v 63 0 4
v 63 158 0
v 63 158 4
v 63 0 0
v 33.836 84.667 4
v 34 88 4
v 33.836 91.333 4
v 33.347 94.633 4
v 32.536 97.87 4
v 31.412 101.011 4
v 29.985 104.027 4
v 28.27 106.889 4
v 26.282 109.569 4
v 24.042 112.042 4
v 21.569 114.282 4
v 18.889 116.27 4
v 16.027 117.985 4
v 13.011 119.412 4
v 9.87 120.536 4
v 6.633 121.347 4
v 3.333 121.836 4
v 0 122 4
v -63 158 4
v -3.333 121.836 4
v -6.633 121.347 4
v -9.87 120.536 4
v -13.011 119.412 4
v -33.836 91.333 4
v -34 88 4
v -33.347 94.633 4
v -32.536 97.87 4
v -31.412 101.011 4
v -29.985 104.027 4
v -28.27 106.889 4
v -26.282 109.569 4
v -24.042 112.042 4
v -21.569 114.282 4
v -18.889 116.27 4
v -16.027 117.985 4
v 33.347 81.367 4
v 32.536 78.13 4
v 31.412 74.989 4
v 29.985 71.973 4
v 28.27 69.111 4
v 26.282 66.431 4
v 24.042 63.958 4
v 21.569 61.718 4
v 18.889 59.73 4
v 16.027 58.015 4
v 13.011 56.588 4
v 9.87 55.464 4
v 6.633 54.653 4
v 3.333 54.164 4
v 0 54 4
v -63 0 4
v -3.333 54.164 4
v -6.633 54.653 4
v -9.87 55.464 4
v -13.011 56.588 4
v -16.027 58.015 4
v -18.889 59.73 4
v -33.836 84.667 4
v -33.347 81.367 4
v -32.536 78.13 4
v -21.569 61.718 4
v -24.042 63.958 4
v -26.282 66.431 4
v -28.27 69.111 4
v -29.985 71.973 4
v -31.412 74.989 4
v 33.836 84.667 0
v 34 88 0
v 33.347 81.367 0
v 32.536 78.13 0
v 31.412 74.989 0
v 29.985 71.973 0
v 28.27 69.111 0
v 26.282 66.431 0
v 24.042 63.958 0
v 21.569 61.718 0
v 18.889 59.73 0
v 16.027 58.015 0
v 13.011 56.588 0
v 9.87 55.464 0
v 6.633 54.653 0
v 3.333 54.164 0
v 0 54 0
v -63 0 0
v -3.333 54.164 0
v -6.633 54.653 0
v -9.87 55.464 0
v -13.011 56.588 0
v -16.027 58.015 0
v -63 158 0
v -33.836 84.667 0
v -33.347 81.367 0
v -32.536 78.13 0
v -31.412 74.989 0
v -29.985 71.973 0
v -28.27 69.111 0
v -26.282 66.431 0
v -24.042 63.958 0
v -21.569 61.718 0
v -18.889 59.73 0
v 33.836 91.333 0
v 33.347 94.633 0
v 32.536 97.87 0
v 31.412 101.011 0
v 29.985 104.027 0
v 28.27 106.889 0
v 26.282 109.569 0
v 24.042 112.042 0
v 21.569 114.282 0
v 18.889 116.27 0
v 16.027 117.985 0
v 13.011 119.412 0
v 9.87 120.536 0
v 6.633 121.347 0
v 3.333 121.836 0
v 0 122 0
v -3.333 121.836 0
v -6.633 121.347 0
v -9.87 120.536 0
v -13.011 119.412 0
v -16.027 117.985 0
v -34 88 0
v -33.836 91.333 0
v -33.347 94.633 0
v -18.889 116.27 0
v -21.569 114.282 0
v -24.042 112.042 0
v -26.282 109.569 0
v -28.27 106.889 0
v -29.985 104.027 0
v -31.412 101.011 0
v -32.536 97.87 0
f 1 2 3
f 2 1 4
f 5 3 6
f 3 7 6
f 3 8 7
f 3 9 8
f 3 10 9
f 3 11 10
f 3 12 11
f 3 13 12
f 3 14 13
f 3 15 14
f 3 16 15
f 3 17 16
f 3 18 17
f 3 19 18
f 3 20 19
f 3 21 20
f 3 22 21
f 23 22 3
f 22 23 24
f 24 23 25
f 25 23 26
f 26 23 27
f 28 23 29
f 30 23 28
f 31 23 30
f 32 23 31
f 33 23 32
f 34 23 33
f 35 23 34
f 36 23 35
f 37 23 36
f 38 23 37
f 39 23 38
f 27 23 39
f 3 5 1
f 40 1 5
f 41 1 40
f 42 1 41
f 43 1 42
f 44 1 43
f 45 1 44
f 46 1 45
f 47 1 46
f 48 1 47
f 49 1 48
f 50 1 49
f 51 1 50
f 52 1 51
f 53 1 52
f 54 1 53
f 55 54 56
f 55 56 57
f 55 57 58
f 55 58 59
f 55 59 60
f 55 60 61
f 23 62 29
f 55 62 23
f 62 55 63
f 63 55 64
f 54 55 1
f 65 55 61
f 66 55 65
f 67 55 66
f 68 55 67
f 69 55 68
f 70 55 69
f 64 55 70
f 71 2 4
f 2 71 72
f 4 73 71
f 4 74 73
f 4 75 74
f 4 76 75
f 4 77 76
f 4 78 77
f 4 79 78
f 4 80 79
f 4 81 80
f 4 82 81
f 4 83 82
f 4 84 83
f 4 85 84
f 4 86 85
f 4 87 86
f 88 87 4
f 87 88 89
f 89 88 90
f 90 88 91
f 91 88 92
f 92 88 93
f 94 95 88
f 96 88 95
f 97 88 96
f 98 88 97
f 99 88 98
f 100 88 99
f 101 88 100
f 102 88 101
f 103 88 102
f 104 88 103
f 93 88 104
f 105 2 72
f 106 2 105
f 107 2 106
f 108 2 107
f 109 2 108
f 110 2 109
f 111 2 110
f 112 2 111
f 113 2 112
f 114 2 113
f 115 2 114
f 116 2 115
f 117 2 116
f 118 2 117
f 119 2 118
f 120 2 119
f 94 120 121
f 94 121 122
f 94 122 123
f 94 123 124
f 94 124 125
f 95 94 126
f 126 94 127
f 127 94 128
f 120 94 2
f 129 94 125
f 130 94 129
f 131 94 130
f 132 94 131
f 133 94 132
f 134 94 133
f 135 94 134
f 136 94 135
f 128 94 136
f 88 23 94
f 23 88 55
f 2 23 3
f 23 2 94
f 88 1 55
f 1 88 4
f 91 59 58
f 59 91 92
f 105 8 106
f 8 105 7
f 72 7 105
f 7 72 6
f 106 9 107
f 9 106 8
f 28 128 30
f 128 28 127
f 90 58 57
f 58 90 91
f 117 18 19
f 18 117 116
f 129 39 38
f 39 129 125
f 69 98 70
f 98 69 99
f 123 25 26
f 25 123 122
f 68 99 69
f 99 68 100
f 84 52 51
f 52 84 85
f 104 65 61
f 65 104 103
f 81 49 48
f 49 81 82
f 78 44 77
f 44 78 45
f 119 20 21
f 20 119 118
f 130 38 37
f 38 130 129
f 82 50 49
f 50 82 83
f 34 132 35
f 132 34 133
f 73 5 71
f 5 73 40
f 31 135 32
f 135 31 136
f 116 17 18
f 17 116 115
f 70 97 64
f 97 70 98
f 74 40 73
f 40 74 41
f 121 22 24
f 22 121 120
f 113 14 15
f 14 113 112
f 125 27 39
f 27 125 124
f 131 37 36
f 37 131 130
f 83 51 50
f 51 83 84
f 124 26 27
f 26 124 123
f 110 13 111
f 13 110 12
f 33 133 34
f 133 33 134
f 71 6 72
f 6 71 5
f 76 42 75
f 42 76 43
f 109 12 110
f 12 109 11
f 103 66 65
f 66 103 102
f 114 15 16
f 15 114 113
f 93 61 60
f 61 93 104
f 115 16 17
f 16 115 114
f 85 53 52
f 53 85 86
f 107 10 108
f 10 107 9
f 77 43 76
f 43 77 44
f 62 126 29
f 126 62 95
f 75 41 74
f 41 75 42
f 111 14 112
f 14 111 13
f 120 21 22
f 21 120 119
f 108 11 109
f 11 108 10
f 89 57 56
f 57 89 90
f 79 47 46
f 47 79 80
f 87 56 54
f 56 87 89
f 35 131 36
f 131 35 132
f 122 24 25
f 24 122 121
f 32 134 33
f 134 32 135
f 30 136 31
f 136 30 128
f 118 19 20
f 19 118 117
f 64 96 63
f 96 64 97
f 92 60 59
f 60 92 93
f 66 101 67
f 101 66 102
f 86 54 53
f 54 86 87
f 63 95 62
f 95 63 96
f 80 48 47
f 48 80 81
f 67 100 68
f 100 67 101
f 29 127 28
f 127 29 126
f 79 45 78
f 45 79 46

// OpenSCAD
// file: ../dimensions.scad
// dimensions.scad — single source of truth for all tray geometry constants.
//
// All values in millimetres unless otherwise noted.
// Sources:
//   - CD/DVD drive envelope: SFF-8551 (5.25" half-height) and laptop slim ODD (9.5 mm)
//   - CD disc geometry: ECMA-130
//   - MiniDisc cartridge: Sony MiniDisc specification (MD)
//   - Issues weyucou/minidisc-tray#1 (3D modeling format research) and
//     weyucou/minidisc-tray#2 (CD/DVD tray dimensions)


// ---------------------------------------------------------------------------
// CD/DVD drive envelope (target form factor)
// ---------------------------------------------------------------------------

// Primary target: 5.25" half-height (SFF-8551) drive body.
DRIVE_BODY_W = 146.1;   // outer width
DRIVE_BODY_H = 41.3;    // outer height
DRIVE_BODY_D = 170;     // outer depth (typical; range 170–203)

// Slim laptop ODD (9.5 mm) — secondary parametric variant.
SLIM_BODY_W = 128;
SLIM_BODY_H = 9.5;
SLIM_BODY_D = 127;


// ---------------------------------------------------------------------------
// CD tray envelope (the cavity the printed tray must fit into)
// ---------------------------------------------------------------------------

// Inner tray usable width — the lateral envelope between the tray side walls.
// Derived in #2: ~63 mm from spindle centre to each side wall.
TRAY_INNER_W = 126;

// Spindle-centre-to-front-bezel distance.
// Range observed across donor drives: 80–95 mm.
// Default = mid-range; UPDATE after physical measurement of the actual donor drive.
SPINDLE_TO_BEZEL = 88;

// CD program area (informational — used to validate spindle clearance).
// ECMA-130: program area lies between r=25 and r=58 mm.
CD_DISC_DIA = 120;
CD_CENTER_HOLE = 15;
CD_CLAMP_R_MIN = 26;
CD_CLAMP_R_MAX = 33;

// Inner tray usable depth — derived from spindle-to-bezel + CD radius + rear margin.
// Matches typical 5.25" half-height CD tray depth. Refine when donor drive measured.
TRAY_INNER_D = SPINDLE_TO_BEZEL + CD_DISC_DIA / 2 + 10;

// Spindle clearance hole radius — clears the CD spindle hub / clamp area.
// Sized at CD_CLAMP_R_MAX + 1 mm safety; also clears the MD internal disc edge.
SPINDLE_CLEARANCE_R = CD_CLAMP_R_MAX + 1;


// ---------------------------------------------------------------------------
// MiniDisc cartridge (the part the tray must position and shutter-actuate)
// ---------------------------------------------------------------------------

// Cartridge outer dimensions — Sony MD spec.
MD_W = 72;   // width  (along shutter slide axis)
MD_D = 68;   // depth  (perpendicular to shutter slide)
MD_H = 5;    // thickness

// Internal disc — used for spindle-clearance hole sizing and centring checks.
MD_DISC_DIA = 64;
MD_CENTER_HOLE = 11;


// ---------------------------------------------------------------------------
// Print and fit tolerances
// ---------------------------------------------------------------------------

// Per-side print clearance applied to mating surfaces (tray-to-cavity, MD pocket).
// Tuned for AFINIA H400+ FDM with default Afinia Studio profile.
FIT_CLEARANCE = 0.4;

// OpenSCAD render facet count for circular features.
// Higher = smoother curves at the cost of render time.
$fn = 64;


// ---------------------------------------------------------------------------
// Tray geometry (design constants)
// ---------------------------------------------------------------------------

// Tray base plate thickness — chosen for FDM stiffness across the full footprint.
// Must exceed MD_POCKET_DEPTH so the pocket leaves a continuous floor.
TRAY_BASE_THICKNESS = 4.0;

// MD pocket recess depth — how far the cartridge sits below the tray surface.
// MD_H = 5 mm; a 3 mm recess leaves the cartridge ~2 mm proud, easy to grip.
MD_POCKET_DEPTH = 3.0;

// Shutter actuator pin geometry — engages the MD cartridge shutter tab from
// inside the pocket as the cartridge is slid into final position.
SHUTTER_PIN_DIA = 3.0;
SHUTTER_PIN_H = 6.0;

// Shutter tab engagement position, measured from the leading corner of the
// MD pocket. Approximate; refine against a physical Sony MD cartridge.
SHUTTER_TAB_X_OFFSET = 5.0;
SHUTTER_TAB_Y_OFFSET = 4.0;
// main file
// tray_base.scad — flat tray plate with central spindle clearance hole.
//
// Coordinate system (shared across all tray parts):
//   - Origin: front-bezel-centre on the bottom face of the tray base
//   - +X: lateral (along bezel width)
//   - +Y: into the drive (away from bezel)
//   - +Z: up (out of the tray plane)
//
// Footprint defaults to the SFF-8551 (5.25" half-height) inner tray dimensions
// from dimensions.scad. Pass smaller values for slim laptop ODD form factor.

include <../dimensions.scad>;

module tray_base(
    inner_w = TRAY_INNER_W,
    inner_d = TRAY_INNER_D,
    thickness = TRAY_BASE_THICKNESS,
    spindle_to_bezel = SPINDLE_TO_BEZEL,
    spindle_clearance_r = SPINDLE_CLEARANCE_R
) {
    difference() {
        translate([-inner_w / 2, 0, 0])
            cube([inner_w, inner_d, thickness]);

        translate([0, spindle_to_bezel, -1])
            cylinder(h = thickness + 2, r = spindle_clearance_r);
    }
}

tray_base();
